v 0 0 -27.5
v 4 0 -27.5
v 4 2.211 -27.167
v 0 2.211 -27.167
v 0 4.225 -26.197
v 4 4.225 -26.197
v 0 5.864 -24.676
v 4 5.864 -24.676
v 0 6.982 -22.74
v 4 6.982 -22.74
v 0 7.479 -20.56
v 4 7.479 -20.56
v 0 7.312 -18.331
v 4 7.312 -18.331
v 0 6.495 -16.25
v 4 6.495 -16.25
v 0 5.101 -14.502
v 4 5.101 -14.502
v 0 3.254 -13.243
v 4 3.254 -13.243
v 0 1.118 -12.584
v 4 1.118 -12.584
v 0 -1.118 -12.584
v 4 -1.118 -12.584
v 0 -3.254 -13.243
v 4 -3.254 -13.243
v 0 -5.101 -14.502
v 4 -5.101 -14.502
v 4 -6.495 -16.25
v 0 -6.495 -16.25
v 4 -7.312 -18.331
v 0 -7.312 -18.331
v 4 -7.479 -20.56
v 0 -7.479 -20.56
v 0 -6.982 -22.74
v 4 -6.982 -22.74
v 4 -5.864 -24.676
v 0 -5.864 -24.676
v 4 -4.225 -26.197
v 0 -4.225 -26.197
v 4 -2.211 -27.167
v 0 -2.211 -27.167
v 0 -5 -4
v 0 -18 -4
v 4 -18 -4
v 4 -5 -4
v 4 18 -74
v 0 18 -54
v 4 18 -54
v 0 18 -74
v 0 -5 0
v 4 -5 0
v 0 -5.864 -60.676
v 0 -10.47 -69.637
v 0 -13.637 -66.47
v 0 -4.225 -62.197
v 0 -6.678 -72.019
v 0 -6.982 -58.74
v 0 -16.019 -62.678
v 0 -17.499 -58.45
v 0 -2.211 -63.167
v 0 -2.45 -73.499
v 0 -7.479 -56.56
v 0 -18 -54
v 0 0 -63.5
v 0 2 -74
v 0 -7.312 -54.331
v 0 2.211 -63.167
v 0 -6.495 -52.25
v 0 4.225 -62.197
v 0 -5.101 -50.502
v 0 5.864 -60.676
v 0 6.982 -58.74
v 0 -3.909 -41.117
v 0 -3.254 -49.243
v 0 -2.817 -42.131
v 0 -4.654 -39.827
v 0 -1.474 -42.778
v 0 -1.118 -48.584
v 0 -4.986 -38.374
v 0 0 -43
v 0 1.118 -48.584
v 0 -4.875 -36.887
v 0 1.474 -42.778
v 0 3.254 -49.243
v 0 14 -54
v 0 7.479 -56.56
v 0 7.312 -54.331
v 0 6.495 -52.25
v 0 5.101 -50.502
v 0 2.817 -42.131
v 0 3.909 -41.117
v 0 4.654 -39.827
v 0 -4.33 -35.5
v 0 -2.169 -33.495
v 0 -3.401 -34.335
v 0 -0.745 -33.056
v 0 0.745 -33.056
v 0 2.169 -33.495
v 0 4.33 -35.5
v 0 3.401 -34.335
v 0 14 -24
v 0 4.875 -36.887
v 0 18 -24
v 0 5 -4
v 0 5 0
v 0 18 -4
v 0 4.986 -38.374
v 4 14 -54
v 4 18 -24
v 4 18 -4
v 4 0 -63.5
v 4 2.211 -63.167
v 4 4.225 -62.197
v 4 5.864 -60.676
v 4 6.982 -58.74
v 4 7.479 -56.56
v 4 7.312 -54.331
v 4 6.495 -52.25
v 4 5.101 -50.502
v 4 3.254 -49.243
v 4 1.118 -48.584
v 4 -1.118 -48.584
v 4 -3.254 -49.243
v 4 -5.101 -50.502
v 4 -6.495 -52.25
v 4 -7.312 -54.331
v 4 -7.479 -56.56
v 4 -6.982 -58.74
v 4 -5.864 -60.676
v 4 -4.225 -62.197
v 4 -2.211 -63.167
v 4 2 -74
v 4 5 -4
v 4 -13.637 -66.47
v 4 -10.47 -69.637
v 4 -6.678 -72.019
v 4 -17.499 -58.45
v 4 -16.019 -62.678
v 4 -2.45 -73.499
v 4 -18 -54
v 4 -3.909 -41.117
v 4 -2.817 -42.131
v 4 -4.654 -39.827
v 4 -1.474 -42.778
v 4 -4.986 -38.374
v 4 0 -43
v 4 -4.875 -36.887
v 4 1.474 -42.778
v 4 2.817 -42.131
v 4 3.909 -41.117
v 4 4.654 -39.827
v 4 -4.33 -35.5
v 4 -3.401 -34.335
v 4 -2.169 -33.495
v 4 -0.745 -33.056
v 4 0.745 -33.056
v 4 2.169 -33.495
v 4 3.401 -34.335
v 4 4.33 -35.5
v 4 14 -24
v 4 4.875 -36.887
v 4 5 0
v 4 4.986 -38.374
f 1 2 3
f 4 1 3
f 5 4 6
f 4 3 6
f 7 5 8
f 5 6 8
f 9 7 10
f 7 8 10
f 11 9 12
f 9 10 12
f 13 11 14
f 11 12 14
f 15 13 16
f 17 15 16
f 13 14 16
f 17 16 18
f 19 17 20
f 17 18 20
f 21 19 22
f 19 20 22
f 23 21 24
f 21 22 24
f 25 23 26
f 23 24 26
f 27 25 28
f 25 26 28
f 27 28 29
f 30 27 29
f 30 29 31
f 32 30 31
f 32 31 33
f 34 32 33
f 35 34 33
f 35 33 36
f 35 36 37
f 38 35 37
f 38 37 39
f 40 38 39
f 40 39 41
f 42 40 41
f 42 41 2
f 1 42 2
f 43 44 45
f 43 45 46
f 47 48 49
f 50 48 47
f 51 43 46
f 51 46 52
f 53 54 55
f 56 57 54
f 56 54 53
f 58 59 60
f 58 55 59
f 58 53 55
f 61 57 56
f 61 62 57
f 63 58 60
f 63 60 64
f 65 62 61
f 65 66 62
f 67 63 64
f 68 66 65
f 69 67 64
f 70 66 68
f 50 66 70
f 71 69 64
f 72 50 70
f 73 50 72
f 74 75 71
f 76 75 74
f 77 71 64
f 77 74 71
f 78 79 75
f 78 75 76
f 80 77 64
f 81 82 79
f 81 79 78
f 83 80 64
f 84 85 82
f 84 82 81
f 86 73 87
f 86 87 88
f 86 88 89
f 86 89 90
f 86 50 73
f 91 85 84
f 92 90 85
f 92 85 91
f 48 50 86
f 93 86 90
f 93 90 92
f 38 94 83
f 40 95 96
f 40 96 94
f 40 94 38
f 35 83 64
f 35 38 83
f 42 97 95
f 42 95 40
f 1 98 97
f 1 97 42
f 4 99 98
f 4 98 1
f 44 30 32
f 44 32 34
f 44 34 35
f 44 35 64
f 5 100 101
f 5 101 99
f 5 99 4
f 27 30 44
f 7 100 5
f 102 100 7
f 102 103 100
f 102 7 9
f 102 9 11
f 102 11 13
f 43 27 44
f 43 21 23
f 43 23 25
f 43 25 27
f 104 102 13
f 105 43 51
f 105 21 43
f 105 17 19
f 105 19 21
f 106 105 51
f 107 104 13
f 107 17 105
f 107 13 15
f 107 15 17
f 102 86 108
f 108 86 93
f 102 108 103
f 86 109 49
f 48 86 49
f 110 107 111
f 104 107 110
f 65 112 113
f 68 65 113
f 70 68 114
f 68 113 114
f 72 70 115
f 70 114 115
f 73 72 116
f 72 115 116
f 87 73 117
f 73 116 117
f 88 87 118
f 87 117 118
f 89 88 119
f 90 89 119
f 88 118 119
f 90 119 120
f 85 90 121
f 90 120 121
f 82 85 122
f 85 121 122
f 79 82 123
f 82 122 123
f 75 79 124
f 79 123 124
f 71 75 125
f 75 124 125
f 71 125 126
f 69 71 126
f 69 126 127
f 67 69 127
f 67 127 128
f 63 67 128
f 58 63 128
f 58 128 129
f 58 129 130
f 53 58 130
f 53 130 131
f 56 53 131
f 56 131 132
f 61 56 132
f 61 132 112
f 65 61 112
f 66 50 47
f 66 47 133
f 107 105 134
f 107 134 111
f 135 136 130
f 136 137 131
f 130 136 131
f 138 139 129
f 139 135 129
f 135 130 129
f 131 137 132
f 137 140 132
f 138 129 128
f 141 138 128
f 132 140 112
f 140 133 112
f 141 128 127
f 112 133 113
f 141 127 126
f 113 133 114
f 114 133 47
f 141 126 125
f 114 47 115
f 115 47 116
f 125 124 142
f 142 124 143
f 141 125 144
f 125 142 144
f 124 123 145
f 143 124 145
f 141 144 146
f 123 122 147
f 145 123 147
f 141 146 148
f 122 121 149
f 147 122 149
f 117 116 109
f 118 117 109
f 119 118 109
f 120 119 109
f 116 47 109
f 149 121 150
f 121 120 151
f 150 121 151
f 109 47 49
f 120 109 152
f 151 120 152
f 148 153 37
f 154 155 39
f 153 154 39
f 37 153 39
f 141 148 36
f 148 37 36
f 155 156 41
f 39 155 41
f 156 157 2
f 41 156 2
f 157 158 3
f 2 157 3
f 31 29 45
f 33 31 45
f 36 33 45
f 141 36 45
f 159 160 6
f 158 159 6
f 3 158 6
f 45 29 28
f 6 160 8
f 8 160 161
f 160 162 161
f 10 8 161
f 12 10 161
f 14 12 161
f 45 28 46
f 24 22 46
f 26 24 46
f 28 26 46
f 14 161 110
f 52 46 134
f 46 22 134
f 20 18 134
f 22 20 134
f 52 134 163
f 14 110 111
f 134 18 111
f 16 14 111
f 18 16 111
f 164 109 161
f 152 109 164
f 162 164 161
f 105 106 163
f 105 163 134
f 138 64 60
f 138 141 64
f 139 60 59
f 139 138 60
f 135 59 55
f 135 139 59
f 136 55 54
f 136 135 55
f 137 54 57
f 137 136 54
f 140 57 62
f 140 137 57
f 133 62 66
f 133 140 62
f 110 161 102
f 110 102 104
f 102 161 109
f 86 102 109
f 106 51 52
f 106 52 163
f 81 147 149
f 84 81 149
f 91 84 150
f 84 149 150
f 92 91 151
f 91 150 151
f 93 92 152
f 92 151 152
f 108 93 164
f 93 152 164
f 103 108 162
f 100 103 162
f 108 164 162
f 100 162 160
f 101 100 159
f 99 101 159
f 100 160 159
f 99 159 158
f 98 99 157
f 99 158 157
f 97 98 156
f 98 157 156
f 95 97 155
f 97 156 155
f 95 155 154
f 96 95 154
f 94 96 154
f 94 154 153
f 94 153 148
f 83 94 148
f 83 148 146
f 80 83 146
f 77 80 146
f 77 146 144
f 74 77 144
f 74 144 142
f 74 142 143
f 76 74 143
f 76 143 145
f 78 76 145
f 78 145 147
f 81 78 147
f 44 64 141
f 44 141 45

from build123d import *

# Parameters (mm, degrees)
AUFSATZ_LINEAR_AUSTRAGEN1_DEPTH = 4
SKIZZE3_W                       = 30
SKIZZE3_H                       = 4
SCHNITT_LINEAR_AUSTRAGEN2_DEPTH = 77.26270386
VERRUNDUNG1_R                   = 20
SKIZZE5_R                       = 7.5
SKIZZE5_R_2                     = 5
SCHNITT_LINEAR_AUSTRAGEN4_DEPTH = 77.26270386


with BuildPart() as part:
    # Skizze1 → Aufsatz-Linear austragen1 (new body)
    with BuildSketch(Plane(origin=(0, 0, 0), x_dir=(0, 0, -1), z_dir=(1, 0, 0))):
        Polygon((0, -5), (0, 5), (4, 5), (4, 18), (74, 18), (74, -18), (4, -18), (4, -5), align=None)
    extrude(amount=AUFSATZ_LINEAR_AUSTRAGEN1_DEPTH)

    # Skizze3 → Schnitt-Linear austragen2 (cut, through all)
    with BuildSketch(Plane(origin=(4, 0, 0), x_dir=(0, 0, -1), z_dir=(1, 0, 0))):
        with Locations((39, 16)):
            Rectangle(SKIZZE3_W, SKIZZE3_H)
    extrude(amount=-SCHNITT_LINEAR_AUSTRAGEN2_DEPTH, mode=Mode.SUBTRACT)

    # Verrundung1
    verrundung1_edges = [part.edges().sort_by_distance(p)[0] for p in [
        (2, -18, -74),
    ]]
    fillet(verrundung1_edges, radius=VERRUNDUNG1_R)

    # Skizze5 → Schnitt-Linear austragen4 (cut, through all)
    with BuildSketch(Plane(origin=(4, 0, 0), x_dir=(0, 0, -1), z_dir=(1, 0, 0))):
        with Locations((20, 0)):
            Circle(SKIZZE5_R)
        with Locations((56, 0)):
            Circle(SKIZZE5_R)
        with Locations((38, 0)):
            Circle(SKIZZE5_R_2)
    extrude(amount=-SCHNITT_LINEAR_AUSTRAGEN4_DEPTH, mode=Mode.SUBTRACT)


solid = part.part
